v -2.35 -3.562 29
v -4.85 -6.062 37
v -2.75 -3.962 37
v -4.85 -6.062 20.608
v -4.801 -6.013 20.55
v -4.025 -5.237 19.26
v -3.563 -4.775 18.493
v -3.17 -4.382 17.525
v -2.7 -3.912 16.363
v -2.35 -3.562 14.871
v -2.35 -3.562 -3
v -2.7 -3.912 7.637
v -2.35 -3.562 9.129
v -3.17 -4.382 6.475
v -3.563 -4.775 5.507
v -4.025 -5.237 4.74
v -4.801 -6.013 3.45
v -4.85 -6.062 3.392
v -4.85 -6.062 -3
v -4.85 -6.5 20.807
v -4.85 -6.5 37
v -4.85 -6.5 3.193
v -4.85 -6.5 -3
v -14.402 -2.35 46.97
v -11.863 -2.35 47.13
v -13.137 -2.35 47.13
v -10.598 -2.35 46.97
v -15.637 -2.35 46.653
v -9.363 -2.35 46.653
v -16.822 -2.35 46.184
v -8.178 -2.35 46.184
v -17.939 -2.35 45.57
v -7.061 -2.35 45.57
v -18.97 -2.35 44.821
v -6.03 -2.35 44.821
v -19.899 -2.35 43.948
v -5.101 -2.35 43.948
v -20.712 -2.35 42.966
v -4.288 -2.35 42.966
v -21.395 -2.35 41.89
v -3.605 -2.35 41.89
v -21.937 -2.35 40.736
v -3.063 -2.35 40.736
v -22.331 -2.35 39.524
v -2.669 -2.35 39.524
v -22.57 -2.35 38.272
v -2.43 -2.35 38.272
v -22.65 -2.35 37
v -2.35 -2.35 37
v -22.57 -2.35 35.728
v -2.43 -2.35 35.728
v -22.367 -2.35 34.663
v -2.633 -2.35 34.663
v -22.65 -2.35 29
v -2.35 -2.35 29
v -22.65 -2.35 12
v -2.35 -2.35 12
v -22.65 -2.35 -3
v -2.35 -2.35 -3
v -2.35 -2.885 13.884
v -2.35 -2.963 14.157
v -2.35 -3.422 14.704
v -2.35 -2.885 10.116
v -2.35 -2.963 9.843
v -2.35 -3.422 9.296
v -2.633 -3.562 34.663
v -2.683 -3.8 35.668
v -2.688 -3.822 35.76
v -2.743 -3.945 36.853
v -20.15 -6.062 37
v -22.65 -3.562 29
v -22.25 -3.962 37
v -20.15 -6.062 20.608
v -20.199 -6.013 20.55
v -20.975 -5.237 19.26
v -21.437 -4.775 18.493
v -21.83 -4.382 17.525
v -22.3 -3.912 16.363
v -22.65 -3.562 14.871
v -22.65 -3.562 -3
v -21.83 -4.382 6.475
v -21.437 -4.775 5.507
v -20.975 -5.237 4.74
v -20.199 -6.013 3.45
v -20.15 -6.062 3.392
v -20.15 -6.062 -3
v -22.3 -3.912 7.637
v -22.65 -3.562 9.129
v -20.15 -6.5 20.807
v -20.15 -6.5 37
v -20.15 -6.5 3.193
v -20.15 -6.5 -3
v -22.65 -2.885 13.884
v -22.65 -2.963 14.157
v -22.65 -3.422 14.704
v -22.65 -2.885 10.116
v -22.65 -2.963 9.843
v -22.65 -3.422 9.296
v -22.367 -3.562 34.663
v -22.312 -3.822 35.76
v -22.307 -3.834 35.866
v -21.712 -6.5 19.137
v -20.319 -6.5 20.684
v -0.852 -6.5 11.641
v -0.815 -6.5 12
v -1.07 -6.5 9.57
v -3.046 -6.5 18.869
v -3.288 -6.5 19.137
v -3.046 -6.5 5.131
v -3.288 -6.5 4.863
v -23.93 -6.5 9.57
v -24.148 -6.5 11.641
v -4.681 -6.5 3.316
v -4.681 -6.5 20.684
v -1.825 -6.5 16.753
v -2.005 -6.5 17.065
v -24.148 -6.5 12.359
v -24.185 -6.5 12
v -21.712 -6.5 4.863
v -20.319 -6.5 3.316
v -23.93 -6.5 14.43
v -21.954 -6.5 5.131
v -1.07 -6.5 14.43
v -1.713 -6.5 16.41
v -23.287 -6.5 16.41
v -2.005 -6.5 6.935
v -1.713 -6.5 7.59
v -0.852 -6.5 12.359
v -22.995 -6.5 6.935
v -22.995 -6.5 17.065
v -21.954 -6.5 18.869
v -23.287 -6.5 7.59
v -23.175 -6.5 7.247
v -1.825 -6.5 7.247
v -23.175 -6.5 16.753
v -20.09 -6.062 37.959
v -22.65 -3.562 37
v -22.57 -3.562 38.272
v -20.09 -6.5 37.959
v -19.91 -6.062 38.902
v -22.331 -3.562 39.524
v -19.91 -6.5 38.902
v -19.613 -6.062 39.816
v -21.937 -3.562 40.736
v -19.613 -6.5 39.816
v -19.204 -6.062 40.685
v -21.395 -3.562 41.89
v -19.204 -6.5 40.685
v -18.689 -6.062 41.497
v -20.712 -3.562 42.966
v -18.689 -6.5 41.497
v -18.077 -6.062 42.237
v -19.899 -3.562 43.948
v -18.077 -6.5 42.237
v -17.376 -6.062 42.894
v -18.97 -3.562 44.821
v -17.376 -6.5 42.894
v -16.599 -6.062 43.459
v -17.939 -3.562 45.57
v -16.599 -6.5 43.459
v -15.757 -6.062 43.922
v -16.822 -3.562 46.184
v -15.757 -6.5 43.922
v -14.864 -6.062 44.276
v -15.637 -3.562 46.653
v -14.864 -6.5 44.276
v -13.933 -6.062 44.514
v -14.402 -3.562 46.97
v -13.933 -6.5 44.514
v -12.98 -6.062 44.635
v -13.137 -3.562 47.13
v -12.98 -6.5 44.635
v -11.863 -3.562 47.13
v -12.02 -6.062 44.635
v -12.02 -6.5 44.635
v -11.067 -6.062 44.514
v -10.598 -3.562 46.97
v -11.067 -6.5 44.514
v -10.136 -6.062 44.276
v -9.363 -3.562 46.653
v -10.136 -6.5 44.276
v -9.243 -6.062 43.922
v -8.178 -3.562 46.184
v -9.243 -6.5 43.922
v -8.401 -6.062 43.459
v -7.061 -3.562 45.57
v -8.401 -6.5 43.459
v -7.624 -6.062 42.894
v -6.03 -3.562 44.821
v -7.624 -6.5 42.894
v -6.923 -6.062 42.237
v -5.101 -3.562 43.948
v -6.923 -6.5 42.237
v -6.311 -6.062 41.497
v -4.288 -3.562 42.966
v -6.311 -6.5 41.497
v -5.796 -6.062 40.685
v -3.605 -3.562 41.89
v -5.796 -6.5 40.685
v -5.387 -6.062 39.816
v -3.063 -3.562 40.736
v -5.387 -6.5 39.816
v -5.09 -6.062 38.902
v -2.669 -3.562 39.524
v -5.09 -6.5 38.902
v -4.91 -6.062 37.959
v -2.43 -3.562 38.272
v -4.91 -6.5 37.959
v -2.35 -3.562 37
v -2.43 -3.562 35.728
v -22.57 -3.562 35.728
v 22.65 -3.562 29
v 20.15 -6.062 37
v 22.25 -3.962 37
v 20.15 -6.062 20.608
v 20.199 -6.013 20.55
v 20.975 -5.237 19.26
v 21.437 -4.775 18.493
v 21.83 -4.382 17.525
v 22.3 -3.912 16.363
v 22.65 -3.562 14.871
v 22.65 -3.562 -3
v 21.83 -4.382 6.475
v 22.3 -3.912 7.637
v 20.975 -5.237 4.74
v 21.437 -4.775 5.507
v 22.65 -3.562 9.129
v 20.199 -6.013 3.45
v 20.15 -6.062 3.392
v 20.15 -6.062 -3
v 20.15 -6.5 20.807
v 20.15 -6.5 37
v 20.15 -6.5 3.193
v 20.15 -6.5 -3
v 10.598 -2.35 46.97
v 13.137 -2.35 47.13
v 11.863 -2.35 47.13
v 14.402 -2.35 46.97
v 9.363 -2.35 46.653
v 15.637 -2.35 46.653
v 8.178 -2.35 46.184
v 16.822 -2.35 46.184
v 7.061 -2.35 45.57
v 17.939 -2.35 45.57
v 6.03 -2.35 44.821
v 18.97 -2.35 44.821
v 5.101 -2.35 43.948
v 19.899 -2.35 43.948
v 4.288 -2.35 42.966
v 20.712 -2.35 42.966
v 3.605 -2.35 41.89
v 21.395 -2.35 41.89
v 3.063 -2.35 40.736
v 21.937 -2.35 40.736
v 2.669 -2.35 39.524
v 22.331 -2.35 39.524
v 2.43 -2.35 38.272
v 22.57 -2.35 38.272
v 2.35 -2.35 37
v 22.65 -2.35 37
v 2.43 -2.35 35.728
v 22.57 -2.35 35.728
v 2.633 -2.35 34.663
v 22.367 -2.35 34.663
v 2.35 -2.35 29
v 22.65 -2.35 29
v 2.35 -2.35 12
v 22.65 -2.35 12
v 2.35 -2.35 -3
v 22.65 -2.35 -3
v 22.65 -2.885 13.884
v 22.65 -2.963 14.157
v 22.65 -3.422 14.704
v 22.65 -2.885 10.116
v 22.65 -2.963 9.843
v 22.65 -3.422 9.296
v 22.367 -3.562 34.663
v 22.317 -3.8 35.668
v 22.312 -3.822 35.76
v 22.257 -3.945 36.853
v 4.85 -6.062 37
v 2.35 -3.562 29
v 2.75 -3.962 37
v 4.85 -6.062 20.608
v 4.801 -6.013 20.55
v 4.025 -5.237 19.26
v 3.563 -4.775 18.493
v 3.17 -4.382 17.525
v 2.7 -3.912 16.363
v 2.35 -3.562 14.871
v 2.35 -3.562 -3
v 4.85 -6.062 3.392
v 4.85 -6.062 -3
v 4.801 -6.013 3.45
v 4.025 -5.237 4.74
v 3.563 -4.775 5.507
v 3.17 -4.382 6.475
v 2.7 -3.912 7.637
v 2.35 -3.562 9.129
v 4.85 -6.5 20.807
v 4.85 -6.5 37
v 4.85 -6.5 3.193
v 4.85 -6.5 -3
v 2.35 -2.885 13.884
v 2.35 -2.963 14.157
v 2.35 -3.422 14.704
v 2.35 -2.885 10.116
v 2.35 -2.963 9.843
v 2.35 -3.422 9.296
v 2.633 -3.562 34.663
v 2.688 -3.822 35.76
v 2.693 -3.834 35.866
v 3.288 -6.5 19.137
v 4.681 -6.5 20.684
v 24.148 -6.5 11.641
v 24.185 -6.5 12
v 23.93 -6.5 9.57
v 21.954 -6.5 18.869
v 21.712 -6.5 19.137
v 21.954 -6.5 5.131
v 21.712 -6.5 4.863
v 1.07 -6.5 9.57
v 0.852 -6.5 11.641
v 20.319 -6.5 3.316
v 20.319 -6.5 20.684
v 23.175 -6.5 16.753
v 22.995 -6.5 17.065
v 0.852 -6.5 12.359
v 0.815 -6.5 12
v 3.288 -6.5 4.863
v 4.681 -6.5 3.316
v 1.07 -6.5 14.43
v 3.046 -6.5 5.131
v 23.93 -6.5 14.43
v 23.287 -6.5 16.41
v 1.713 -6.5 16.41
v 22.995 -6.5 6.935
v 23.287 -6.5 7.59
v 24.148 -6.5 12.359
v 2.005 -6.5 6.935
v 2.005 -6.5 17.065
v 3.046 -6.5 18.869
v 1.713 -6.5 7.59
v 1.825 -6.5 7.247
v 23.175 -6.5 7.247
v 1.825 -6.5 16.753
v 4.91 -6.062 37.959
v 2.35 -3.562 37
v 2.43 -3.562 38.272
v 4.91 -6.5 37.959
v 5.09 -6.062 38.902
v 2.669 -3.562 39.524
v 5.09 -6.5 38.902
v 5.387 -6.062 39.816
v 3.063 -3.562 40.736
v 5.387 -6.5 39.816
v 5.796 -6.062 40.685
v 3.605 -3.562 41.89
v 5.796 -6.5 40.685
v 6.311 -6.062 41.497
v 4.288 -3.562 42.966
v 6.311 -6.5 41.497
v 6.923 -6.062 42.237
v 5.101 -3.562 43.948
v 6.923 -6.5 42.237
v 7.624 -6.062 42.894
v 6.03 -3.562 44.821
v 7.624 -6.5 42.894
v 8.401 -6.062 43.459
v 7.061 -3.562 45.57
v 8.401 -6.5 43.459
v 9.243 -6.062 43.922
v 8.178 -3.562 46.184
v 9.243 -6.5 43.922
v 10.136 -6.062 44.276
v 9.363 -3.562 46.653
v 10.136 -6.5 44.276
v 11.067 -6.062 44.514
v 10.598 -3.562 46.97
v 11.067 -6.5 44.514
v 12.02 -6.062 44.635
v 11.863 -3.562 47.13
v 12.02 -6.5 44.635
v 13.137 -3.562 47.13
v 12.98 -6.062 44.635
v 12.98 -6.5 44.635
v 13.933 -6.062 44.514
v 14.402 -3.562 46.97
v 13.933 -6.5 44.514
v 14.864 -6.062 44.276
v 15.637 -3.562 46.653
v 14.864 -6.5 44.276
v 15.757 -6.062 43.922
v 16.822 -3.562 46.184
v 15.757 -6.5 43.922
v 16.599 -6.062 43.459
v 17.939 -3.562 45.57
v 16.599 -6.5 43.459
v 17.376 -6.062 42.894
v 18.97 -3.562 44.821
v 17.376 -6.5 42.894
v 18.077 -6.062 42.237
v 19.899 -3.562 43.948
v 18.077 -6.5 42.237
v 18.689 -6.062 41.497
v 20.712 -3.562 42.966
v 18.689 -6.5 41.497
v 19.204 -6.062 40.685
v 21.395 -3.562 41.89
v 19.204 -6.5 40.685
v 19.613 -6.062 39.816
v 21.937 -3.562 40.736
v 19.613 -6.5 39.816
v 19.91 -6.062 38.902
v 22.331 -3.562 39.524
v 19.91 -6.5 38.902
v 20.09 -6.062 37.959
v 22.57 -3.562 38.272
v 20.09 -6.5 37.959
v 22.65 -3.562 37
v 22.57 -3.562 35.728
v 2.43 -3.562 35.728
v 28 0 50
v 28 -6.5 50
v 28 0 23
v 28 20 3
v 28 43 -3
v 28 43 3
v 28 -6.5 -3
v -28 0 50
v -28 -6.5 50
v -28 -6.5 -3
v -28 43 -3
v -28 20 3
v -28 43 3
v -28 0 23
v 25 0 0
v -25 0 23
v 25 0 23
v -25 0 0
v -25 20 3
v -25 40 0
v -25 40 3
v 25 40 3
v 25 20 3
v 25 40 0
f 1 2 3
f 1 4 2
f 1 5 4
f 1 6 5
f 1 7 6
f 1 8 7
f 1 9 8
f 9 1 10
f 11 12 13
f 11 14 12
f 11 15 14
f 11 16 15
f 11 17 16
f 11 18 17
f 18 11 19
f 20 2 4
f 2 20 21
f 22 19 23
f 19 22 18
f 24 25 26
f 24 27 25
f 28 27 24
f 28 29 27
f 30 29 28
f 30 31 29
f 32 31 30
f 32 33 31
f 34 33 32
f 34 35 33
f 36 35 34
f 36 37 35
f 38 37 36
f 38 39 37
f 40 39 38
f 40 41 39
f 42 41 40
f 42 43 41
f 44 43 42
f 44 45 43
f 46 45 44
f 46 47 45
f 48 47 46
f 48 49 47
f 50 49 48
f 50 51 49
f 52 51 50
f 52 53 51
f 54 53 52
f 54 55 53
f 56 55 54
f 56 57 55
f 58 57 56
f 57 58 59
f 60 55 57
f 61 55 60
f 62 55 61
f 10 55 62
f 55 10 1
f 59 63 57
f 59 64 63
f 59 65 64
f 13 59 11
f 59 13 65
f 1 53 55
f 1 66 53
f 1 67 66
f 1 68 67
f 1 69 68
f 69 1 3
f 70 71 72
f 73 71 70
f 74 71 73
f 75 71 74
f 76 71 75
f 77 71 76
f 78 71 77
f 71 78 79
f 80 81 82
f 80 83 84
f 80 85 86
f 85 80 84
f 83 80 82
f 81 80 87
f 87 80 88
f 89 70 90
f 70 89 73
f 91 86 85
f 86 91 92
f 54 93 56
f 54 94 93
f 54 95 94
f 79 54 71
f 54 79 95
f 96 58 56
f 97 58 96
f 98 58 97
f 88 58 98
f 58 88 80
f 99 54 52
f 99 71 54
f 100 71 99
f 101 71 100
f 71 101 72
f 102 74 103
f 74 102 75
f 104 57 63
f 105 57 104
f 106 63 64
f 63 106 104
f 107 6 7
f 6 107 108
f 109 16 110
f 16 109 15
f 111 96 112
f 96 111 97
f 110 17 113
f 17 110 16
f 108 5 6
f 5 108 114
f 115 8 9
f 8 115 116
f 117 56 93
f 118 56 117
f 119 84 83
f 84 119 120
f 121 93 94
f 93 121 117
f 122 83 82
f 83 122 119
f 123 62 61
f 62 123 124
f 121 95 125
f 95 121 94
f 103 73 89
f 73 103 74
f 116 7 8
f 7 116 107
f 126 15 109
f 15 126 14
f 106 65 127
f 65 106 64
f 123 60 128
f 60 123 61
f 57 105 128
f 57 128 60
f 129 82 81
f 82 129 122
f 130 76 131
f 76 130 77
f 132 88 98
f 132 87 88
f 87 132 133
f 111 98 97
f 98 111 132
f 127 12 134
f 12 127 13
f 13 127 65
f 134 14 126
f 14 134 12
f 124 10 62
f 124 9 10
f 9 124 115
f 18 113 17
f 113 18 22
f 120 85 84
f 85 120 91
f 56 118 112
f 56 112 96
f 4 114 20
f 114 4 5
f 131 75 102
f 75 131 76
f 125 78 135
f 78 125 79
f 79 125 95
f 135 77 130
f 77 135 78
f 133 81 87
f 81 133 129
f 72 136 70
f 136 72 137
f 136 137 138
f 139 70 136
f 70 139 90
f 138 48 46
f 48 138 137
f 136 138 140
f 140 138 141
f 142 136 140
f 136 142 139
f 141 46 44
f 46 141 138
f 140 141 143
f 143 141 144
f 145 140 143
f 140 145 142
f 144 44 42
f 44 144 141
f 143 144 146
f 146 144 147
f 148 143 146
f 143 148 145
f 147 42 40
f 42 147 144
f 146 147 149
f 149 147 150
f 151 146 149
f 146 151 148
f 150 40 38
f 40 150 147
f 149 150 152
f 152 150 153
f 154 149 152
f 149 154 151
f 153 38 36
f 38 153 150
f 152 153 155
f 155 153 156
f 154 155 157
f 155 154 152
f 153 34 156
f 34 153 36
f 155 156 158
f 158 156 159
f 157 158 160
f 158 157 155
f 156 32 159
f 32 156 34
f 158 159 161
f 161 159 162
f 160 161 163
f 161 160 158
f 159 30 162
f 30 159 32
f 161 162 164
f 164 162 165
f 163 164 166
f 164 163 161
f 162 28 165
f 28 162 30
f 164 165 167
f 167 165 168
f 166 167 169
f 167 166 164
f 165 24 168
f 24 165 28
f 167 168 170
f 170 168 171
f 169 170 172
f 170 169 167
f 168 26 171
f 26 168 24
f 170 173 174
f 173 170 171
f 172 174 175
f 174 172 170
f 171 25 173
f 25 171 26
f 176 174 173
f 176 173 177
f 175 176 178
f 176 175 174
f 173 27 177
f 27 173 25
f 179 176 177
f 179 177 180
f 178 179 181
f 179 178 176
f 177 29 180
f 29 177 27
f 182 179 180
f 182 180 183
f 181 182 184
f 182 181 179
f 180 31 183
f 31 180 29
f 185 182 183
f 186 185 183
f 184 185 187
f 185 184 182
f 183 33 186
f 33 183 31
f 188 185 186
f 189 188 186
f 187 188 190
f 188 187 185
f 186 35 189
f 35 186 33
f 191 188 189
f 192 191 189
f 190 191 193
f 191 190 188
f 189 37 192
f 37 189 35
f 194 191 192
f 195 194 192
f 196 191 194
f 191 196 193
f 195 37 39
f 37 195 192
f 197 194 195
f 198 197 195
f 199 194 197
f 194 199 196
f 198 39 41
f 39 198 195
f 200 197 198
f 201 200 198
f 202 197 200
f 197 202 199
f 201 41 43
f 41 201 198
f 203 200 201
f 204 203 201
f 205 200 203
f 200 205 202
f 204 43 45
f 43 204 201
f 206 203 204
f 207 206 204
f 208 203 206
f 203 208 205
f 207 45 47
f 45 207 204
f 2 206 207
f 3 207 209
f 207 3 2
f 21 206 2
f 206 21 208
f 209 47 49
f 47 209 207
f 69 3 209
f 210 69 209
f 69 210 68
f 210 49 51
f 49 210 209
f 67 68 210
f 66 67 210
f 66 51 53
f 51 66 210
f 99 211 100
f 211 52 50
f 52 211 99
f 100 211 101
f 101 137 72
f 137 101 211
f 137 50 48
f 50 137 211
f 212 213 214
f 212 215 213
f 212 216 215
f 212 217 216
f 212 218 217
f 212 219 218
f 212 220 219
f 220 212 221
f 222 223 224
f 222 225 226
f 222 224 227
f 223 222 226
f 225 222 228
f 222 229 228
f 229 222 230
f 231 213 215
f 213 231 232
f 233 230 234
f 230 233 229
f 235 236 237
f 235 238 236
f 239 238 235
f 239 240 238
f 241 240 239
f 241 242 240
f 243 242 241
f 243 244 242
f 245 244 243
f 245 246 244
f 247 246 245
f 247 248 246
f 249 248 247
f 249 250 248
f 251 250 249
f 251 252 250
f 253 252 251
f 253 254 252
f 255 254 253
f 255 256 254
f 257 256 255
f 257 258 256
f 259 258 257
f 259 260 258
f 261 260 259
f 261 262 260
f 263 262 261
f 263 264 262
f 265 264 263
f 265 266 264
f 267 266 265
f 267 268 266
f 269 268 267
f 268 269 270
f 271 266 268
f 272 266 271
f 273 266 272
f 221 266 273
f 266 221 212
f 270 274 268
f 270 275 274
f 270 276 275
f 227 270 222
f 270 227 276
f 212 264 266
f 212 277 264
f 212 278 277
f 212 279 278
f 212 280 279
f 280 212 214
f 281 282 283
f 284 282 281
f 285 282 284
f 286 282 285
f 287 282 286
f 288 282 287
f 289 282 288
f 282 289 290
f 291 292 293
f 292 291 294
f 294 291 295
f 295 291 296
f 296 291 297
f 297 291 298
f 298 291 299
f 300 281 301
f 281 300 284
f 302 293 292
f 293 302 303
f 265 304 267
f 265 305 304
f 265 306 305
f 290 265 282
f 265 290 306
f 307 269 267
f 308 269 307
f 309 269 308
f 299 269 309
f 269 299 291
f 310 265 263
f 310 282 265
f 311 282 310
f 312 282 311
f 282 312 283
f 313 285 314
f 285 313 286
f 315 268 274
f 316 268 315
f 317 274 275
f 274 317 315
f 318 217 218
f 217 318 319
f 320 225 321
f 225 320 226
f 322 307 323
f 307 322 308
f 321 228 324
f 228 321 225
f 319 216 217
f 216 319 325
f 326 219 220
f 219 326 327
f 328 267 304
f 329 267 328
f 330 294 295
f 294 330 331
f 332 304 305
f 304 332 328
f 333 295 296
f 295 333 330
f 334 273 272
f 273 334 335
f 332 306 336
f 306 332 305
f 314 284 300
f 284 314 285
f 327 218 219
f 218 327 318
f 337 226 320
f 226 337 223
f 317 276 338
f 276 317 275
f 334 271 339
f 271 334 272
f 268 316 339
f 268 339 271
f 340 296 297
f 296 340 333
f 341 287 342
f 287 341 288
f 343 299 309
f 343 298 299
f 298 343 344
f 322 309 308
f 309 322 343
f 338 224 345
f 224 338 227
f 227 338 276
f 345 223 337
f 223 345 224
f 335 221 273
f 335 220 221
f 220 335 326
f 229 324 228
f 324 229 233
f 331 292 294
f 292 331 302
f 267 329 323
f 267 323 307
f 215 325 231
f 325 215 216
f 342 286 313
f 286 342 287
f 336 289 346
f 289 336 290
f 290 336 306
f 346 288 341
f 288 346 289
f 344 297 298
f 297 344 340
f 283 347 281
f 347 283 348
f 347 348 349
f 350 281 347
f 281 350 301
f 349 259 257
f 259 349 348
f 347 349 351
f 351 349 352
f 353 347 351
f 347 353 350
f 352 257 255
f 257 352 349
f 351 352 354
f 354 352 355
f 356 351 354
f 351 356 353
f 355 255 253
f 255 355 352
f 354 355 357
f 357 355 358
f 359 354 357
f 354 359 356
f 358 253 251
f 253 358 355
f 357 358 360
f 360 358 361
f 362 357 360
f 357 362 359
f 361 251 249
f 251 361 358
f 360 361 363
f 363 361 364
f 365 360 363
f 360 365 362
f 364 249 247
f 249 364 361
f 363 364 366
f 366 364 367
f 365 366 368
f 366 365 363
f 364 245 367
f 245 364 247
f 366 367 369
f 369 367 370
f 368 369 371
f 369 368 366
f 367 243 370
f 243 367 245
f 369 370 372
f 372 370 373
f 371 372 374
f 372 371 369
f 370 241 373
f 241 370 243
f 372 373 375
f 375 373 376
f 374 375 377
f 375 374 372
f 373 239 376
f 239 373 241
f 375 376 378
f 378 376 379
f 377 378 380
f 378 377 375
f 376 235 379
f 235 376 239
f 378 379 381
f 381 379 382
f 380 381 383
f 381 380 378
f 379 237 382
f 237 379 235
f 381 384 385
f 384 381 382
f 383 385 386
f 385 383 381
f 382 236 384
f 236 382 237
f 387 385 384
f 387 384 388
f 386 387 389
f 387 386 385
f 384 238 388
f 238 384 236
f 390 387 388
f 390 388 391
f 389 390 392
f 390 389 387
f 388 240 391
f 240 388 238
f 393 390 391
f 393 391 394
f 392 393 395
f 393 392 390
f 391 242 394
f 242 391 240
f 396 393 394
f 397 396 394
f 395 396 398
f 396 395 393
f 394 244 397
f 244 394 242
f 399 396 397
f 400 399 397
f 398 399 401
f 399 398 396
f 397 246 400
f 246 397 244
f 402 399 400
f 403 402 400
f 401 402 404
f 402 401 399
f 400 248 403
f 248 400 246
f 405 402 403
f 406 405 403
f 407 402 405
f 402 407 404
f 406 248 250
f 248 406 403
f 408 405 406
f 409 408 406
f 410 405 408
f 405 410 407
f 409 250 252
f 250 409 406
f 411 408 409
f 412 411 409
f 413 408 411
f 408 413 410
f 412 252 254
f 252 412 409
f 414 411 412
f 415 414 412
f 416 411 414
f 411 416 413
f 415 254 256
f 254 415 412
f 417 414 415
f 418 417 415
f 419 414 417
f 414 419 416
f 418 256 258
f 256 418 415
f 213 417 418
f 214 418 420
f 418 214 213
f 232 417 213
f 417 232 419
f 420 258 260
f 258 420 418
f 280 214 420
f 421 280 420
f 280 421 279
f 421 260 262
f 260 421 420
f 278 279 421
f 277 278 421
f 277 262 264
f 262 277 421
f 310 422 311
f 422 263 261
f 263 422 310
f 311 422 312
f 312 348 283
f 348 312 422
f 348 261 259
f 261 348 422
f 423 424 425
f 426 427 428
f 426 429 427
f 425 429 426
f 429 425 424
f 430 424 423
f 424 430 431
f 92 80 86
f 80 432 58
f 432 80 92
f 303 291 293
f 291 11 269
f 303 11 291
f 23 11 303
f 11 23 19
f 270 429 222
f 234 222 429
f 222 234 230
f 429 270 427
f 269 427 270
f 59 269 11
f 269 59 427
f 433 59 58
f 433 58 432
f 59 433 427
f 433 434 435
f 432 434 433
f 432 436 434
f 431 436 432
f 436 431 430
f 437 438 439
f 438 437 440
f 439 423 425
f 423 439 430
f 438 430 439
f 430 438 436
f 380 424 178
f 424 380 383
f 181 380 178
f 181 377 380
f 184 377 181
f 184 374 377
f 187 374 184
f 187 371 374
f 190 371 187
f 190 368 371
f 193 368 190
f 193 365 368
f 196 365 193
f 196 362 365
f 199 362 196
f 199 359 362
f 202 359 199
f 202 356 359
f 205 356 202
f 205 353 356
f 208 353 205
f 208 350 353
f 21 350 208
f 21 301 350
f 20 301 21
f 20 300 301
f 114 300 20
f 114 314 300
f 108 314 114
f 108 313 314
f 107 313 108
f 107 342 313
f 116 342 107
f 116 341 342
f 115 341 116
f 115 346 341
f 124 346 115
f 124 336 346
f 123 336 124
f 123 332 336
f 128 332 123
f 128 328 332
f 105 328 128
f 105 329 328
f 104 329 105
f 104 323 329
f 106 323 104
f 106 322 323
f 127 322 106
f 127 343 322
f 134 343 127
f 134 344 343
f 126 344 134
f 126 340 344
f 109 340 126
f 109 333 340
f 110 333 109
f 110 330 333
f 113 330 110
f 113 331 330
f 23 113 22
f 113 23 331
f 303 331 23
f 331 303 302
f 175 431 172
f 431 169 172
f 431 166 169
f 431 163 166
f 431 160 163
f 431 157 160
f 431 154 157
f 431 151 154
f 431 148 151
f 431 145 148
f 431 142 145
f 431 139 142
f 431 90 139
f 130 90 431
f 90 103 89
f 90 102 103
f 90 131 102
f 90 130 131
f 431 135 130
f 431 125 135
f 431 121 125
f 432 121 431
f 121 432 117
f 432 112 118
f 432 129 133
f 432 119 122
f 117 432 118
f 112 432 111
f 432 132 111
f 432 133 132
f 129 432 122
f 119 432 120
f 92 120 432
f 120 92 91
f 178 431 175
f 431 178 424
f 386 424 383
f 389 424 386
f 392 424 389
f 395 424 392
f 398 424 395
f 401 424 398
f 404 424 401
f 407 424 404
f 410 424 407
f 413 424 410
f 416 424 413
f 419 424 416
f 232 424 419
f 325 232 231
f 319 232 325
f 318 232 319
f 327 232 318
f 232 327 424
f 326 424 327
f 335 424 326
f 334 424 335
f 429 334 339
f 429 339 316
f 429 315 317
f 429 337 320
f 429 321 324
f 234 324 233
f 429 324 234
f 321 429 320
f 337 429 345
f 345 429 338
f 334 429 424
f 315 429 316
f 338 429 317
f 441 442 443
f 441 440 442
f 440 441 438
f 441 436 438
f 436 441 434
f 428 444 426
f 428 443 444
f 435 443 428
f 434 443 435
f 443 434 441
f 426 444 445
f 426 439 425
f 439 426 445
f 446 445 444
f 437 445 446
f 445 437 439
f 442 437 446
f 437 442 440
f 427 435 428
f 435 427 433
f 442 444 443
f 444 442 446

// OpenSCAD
/*Created by Andy Levesque
Credit to @David D on Printables and Jonathan at Keep Making for Multiconnect and Multiboard, respectively
Licensed Creative Commons 4.0 Attribution Non-Commercial Sharable with Attribution
*/

/* [Internal Dimensions] */
//Height (in mm) from the top of the back to the base of the internal floor
internalHeight = 50.0; //.1
//Width (in mm) of the internal dimension or item you wish to hold
internalWidth = 50.0; //.1
//Length (i.e., distance from back) (in mm) of the internal dimension or item you wish to hold
internalDepth = 40.0; //.1

/* [Shelf Customizations] */
//Distance upward from the bottom (in mm) that captures the bottom front of the item
rimHeight = 3;
bracket_style = "45deg"; //[45deg,half_distance,none]

/* [Additional Customization] */
//Thickness of bin walls (in mm)
wallThickness = 3; //.1
//Thickness of bin  (in mm)
baseThickness = 3; //.1

/*[Slot Customization]*/
// Version of multiconnect (dimple or snap)
multiConnectVersion = "v2"; // [v1, v2]
//Distance between Multiconnect slots on the back (25mm is standard for MultiBoard)
distanceBetweenSlots = 25;
//QuickRelease removes the small indent in the top of the slots that lock the part into place
slotQuickRelease = false;
//Dimple scale tweaks the size of the dimple in the slot for printers that need a larger dimple to print correctly
dimpleScale = 1; //[0.5:.05:1.5]
//Scale the size of slots in the back (1.015 scale is default for a tight fit. Increase if your finding poor fit. )
slotTolerance = 1.00; //[0.925:0.005:1.075]
//Move the slot in (positive) or out (negative)
slotDepthMicroadjustment = 0; //[-.5:0.05:.5]
//enable a slot on-ramp for easy mounting of tall items
onRampEnabled = true;
//frequency of slots for on-ramp. 1 = every slot; 2 = every 2 slots; etc.
onRampEveryXSlots = 1;


/* [Hidden] */

//Calculated
totalHeight = max(internalHeight+baseThickness,distanceBetweenSlots);
totalDepth = internalDepth + wallThickness;
totalWidth = max(internalWidth + wallThickness*2,distanceBetweenSlots);
productCenterX = internalWidth/2;


//move to center
translate(v = [-totalWidth/2,0,-baseThickness]) 
    multiconnectBack(backWidth = totalWidth, backHeight = totalHeight, distanceBetweenSlots = distanceBetweenSlots);
translate(v = [-internalWidth/2,0,0]) 
    //Basket minus slots
    difference() {
        shelf();
            //delete tool for anything above the product (i.e., bracket fix)
        translate(v = [-wallThickness-1 ,-1,internalHeight]) cube([totalWidth+2,totalDepth+2,totalHeight]); 
    }

//Create Basket
module shelf() {
    union() {
        //bottom
        translate([-wallThickness,0,-baseThickness])
            cube([internalWidth + wallThickness*2, internalDepth + wallThickness,baseThickness]);

        //left wall
        translate([-wallThickness,0,0])
            cube([wallThickness, internalDepth + wallThickness, rimHeight]);

        //right wall
        translate([internalWidth,0,0])
            cube([wallThickness, internalDepth + wallThickness, rimHeight]);

        //front wall
        translate([0,internalDepth,0]) 
            cube([internalWidth,wallThickness,rimHeight]);

        bracketDistance = min(internalHeight/2,internalDepth/2);
        echo(str("Bracket Distance: ",bracketDistance));
        
        //shelf brackets      
        if (bracket_style == "half_distance") {
            translate(v = [0,0,internalHeight/2+rimHeight])
                shelfBracket(bracketHeight = internalHeight/2, bracketDepth = internalDepth/2);
            translate(v = [internalWidth+wallThickness,0,internalHeight/2+rimHeight])
                shelfBracket(bracketHeight = internalHeight/2, bracketDepth = internalDepth/2);
        }
        if (bracket_style == "45deg"){
            translate(v = [0,0,bracketDistance+rimHeight])
                shelfBracket(bracketHeight = bracketDistance, bracketDepth = bracketDistance);
            translate(v = [internalWidth+wallThickness,0,bracketDistance+rimHeight])
                shelfBracket(bracketHeight = bracketDistance, bracketDepth = bracketDistance);
        }
    }
            
}

//BEGIN MODULES
//Slotted back Module
module multiconnectBack(backWidth, backHeight, distanceBetweenSlots)
{
    //slot count calculates how many slots can fit on the back. Based on internal width for buffer. 
    //slot width needs to be at least the distance between slot for at least 1 slot to generate
    let (backWidth = max(backWidth,distanceBetweenSlots), backHeight = max(backHeight, 25),slotCount = floor(backWidth/distanceBetweenSlots), backThickness = 6.5){
        difference() {
            translate(v = [0,-backThickness,0]) cube(size = [backWidth,backThickness,backHeight]);
            //Loop through slots and center on the item
            //Note: I kept doing math until it looked right. It's possible this can be simplified.
            for (slotNum = [0:1:slotCount-1]) {
                translate(v = [distanceBetweenSlots/2+(backWidth/distanceBetweenSlots-slotCount)*distanceBetweenSlots/2+slotNum*distanceBetweenSlots,-2.35+slotDepthMicroadjustment,backHeight-13]) {
                    slotTool(backHeight);
                }
            }
        }
    }
    //Create Slot Tool
    module slotTool(totalHeight) {
        scale(v = slotTolerance)
        //slot minus optional dimple with optional on-ramp
        let (slotProfile = [[0,0],[10.15,0],[10.15,1.2121],[7.65,3.712],[7.65,5],[0,5]])
        difference() {
            union() {
                //round top
                rotate(a = [90,0,0,]) 
                    rotate_extrude($fn=50) 
                        polygon(points = slotProfile);
                //long slot
                translate(v = [0,0,0]) 
                    rotate(a = [180,0,0]) 
                    union(){
                        difference() {
                            // Main half slot
                            linear_extrude(height = totalHeight+1) 
                                polygon(points = slotProfile);
                            
                            // Snap cutout
                            if (slotQuickRelease == false && multiConnectVersion == "v2")
                                translate(v= [10.15,0,0])
                                rotate(a= [-90,0,0])
                                linear_extrude(height = 5)  // match slot height (5mm)
                                    polygon(points = [[0,0],[-0.4,0],[0,-8]]);  // triangle polygon with multiconnect v2 specs
                            }

                        mirror([1,0,0])
                            difference() {
                                // Main half slot
                                linear_extrude(height = totalHeight+1) 
                                    polygon(points = slotProfile);
                                
                                // Snap cutout
                                if (slotQuickRelease == false && multiConnectVersion == "v2")
                                    translate(v= [10.15,0,0])
                                    rotate(a= [-90,0,0])
                                    linear_extrude(height = 5)  // match slot height (5mm)
                                        polygon(points = [[0,0],[-0.4,0],[0,-8]]);  // triangle polygon with multiconnect v2 spec
                            }
                    }
                //on-ramp
                if(onRampEnabled)
                    for(y = [1:onRampEveryXSlots:totalHeight/distanceBetweenSlots])
                        translate(v = [0,-5,-y*distanceBetweenSlots]) 
                            rotate(a = [-90,0,0]) 
                                cylinder(h = 5, r1 = 12, r2 = 10.15);
            }
            //dimple
            if (slotQuickRelease == false && multiConnectVersion == "v1")
                scale(v = dimpleScale) 
                rotate(a = [90,0,0,]) 
                    rotate_extrude($fn=50) 
                        polygon(points = [[0,0],[0,1.5],[1.5,0]]);
        }
    }
}

module shelfBracket(bracketHeight, bracketDepth){
        rotate(a = [-90,0,90]) 
            linear_extrude(height = wallThickness) 
                polygon([[0,0],[0,bracketHeight],[bracketDepth,bracketHeight]]);
}
